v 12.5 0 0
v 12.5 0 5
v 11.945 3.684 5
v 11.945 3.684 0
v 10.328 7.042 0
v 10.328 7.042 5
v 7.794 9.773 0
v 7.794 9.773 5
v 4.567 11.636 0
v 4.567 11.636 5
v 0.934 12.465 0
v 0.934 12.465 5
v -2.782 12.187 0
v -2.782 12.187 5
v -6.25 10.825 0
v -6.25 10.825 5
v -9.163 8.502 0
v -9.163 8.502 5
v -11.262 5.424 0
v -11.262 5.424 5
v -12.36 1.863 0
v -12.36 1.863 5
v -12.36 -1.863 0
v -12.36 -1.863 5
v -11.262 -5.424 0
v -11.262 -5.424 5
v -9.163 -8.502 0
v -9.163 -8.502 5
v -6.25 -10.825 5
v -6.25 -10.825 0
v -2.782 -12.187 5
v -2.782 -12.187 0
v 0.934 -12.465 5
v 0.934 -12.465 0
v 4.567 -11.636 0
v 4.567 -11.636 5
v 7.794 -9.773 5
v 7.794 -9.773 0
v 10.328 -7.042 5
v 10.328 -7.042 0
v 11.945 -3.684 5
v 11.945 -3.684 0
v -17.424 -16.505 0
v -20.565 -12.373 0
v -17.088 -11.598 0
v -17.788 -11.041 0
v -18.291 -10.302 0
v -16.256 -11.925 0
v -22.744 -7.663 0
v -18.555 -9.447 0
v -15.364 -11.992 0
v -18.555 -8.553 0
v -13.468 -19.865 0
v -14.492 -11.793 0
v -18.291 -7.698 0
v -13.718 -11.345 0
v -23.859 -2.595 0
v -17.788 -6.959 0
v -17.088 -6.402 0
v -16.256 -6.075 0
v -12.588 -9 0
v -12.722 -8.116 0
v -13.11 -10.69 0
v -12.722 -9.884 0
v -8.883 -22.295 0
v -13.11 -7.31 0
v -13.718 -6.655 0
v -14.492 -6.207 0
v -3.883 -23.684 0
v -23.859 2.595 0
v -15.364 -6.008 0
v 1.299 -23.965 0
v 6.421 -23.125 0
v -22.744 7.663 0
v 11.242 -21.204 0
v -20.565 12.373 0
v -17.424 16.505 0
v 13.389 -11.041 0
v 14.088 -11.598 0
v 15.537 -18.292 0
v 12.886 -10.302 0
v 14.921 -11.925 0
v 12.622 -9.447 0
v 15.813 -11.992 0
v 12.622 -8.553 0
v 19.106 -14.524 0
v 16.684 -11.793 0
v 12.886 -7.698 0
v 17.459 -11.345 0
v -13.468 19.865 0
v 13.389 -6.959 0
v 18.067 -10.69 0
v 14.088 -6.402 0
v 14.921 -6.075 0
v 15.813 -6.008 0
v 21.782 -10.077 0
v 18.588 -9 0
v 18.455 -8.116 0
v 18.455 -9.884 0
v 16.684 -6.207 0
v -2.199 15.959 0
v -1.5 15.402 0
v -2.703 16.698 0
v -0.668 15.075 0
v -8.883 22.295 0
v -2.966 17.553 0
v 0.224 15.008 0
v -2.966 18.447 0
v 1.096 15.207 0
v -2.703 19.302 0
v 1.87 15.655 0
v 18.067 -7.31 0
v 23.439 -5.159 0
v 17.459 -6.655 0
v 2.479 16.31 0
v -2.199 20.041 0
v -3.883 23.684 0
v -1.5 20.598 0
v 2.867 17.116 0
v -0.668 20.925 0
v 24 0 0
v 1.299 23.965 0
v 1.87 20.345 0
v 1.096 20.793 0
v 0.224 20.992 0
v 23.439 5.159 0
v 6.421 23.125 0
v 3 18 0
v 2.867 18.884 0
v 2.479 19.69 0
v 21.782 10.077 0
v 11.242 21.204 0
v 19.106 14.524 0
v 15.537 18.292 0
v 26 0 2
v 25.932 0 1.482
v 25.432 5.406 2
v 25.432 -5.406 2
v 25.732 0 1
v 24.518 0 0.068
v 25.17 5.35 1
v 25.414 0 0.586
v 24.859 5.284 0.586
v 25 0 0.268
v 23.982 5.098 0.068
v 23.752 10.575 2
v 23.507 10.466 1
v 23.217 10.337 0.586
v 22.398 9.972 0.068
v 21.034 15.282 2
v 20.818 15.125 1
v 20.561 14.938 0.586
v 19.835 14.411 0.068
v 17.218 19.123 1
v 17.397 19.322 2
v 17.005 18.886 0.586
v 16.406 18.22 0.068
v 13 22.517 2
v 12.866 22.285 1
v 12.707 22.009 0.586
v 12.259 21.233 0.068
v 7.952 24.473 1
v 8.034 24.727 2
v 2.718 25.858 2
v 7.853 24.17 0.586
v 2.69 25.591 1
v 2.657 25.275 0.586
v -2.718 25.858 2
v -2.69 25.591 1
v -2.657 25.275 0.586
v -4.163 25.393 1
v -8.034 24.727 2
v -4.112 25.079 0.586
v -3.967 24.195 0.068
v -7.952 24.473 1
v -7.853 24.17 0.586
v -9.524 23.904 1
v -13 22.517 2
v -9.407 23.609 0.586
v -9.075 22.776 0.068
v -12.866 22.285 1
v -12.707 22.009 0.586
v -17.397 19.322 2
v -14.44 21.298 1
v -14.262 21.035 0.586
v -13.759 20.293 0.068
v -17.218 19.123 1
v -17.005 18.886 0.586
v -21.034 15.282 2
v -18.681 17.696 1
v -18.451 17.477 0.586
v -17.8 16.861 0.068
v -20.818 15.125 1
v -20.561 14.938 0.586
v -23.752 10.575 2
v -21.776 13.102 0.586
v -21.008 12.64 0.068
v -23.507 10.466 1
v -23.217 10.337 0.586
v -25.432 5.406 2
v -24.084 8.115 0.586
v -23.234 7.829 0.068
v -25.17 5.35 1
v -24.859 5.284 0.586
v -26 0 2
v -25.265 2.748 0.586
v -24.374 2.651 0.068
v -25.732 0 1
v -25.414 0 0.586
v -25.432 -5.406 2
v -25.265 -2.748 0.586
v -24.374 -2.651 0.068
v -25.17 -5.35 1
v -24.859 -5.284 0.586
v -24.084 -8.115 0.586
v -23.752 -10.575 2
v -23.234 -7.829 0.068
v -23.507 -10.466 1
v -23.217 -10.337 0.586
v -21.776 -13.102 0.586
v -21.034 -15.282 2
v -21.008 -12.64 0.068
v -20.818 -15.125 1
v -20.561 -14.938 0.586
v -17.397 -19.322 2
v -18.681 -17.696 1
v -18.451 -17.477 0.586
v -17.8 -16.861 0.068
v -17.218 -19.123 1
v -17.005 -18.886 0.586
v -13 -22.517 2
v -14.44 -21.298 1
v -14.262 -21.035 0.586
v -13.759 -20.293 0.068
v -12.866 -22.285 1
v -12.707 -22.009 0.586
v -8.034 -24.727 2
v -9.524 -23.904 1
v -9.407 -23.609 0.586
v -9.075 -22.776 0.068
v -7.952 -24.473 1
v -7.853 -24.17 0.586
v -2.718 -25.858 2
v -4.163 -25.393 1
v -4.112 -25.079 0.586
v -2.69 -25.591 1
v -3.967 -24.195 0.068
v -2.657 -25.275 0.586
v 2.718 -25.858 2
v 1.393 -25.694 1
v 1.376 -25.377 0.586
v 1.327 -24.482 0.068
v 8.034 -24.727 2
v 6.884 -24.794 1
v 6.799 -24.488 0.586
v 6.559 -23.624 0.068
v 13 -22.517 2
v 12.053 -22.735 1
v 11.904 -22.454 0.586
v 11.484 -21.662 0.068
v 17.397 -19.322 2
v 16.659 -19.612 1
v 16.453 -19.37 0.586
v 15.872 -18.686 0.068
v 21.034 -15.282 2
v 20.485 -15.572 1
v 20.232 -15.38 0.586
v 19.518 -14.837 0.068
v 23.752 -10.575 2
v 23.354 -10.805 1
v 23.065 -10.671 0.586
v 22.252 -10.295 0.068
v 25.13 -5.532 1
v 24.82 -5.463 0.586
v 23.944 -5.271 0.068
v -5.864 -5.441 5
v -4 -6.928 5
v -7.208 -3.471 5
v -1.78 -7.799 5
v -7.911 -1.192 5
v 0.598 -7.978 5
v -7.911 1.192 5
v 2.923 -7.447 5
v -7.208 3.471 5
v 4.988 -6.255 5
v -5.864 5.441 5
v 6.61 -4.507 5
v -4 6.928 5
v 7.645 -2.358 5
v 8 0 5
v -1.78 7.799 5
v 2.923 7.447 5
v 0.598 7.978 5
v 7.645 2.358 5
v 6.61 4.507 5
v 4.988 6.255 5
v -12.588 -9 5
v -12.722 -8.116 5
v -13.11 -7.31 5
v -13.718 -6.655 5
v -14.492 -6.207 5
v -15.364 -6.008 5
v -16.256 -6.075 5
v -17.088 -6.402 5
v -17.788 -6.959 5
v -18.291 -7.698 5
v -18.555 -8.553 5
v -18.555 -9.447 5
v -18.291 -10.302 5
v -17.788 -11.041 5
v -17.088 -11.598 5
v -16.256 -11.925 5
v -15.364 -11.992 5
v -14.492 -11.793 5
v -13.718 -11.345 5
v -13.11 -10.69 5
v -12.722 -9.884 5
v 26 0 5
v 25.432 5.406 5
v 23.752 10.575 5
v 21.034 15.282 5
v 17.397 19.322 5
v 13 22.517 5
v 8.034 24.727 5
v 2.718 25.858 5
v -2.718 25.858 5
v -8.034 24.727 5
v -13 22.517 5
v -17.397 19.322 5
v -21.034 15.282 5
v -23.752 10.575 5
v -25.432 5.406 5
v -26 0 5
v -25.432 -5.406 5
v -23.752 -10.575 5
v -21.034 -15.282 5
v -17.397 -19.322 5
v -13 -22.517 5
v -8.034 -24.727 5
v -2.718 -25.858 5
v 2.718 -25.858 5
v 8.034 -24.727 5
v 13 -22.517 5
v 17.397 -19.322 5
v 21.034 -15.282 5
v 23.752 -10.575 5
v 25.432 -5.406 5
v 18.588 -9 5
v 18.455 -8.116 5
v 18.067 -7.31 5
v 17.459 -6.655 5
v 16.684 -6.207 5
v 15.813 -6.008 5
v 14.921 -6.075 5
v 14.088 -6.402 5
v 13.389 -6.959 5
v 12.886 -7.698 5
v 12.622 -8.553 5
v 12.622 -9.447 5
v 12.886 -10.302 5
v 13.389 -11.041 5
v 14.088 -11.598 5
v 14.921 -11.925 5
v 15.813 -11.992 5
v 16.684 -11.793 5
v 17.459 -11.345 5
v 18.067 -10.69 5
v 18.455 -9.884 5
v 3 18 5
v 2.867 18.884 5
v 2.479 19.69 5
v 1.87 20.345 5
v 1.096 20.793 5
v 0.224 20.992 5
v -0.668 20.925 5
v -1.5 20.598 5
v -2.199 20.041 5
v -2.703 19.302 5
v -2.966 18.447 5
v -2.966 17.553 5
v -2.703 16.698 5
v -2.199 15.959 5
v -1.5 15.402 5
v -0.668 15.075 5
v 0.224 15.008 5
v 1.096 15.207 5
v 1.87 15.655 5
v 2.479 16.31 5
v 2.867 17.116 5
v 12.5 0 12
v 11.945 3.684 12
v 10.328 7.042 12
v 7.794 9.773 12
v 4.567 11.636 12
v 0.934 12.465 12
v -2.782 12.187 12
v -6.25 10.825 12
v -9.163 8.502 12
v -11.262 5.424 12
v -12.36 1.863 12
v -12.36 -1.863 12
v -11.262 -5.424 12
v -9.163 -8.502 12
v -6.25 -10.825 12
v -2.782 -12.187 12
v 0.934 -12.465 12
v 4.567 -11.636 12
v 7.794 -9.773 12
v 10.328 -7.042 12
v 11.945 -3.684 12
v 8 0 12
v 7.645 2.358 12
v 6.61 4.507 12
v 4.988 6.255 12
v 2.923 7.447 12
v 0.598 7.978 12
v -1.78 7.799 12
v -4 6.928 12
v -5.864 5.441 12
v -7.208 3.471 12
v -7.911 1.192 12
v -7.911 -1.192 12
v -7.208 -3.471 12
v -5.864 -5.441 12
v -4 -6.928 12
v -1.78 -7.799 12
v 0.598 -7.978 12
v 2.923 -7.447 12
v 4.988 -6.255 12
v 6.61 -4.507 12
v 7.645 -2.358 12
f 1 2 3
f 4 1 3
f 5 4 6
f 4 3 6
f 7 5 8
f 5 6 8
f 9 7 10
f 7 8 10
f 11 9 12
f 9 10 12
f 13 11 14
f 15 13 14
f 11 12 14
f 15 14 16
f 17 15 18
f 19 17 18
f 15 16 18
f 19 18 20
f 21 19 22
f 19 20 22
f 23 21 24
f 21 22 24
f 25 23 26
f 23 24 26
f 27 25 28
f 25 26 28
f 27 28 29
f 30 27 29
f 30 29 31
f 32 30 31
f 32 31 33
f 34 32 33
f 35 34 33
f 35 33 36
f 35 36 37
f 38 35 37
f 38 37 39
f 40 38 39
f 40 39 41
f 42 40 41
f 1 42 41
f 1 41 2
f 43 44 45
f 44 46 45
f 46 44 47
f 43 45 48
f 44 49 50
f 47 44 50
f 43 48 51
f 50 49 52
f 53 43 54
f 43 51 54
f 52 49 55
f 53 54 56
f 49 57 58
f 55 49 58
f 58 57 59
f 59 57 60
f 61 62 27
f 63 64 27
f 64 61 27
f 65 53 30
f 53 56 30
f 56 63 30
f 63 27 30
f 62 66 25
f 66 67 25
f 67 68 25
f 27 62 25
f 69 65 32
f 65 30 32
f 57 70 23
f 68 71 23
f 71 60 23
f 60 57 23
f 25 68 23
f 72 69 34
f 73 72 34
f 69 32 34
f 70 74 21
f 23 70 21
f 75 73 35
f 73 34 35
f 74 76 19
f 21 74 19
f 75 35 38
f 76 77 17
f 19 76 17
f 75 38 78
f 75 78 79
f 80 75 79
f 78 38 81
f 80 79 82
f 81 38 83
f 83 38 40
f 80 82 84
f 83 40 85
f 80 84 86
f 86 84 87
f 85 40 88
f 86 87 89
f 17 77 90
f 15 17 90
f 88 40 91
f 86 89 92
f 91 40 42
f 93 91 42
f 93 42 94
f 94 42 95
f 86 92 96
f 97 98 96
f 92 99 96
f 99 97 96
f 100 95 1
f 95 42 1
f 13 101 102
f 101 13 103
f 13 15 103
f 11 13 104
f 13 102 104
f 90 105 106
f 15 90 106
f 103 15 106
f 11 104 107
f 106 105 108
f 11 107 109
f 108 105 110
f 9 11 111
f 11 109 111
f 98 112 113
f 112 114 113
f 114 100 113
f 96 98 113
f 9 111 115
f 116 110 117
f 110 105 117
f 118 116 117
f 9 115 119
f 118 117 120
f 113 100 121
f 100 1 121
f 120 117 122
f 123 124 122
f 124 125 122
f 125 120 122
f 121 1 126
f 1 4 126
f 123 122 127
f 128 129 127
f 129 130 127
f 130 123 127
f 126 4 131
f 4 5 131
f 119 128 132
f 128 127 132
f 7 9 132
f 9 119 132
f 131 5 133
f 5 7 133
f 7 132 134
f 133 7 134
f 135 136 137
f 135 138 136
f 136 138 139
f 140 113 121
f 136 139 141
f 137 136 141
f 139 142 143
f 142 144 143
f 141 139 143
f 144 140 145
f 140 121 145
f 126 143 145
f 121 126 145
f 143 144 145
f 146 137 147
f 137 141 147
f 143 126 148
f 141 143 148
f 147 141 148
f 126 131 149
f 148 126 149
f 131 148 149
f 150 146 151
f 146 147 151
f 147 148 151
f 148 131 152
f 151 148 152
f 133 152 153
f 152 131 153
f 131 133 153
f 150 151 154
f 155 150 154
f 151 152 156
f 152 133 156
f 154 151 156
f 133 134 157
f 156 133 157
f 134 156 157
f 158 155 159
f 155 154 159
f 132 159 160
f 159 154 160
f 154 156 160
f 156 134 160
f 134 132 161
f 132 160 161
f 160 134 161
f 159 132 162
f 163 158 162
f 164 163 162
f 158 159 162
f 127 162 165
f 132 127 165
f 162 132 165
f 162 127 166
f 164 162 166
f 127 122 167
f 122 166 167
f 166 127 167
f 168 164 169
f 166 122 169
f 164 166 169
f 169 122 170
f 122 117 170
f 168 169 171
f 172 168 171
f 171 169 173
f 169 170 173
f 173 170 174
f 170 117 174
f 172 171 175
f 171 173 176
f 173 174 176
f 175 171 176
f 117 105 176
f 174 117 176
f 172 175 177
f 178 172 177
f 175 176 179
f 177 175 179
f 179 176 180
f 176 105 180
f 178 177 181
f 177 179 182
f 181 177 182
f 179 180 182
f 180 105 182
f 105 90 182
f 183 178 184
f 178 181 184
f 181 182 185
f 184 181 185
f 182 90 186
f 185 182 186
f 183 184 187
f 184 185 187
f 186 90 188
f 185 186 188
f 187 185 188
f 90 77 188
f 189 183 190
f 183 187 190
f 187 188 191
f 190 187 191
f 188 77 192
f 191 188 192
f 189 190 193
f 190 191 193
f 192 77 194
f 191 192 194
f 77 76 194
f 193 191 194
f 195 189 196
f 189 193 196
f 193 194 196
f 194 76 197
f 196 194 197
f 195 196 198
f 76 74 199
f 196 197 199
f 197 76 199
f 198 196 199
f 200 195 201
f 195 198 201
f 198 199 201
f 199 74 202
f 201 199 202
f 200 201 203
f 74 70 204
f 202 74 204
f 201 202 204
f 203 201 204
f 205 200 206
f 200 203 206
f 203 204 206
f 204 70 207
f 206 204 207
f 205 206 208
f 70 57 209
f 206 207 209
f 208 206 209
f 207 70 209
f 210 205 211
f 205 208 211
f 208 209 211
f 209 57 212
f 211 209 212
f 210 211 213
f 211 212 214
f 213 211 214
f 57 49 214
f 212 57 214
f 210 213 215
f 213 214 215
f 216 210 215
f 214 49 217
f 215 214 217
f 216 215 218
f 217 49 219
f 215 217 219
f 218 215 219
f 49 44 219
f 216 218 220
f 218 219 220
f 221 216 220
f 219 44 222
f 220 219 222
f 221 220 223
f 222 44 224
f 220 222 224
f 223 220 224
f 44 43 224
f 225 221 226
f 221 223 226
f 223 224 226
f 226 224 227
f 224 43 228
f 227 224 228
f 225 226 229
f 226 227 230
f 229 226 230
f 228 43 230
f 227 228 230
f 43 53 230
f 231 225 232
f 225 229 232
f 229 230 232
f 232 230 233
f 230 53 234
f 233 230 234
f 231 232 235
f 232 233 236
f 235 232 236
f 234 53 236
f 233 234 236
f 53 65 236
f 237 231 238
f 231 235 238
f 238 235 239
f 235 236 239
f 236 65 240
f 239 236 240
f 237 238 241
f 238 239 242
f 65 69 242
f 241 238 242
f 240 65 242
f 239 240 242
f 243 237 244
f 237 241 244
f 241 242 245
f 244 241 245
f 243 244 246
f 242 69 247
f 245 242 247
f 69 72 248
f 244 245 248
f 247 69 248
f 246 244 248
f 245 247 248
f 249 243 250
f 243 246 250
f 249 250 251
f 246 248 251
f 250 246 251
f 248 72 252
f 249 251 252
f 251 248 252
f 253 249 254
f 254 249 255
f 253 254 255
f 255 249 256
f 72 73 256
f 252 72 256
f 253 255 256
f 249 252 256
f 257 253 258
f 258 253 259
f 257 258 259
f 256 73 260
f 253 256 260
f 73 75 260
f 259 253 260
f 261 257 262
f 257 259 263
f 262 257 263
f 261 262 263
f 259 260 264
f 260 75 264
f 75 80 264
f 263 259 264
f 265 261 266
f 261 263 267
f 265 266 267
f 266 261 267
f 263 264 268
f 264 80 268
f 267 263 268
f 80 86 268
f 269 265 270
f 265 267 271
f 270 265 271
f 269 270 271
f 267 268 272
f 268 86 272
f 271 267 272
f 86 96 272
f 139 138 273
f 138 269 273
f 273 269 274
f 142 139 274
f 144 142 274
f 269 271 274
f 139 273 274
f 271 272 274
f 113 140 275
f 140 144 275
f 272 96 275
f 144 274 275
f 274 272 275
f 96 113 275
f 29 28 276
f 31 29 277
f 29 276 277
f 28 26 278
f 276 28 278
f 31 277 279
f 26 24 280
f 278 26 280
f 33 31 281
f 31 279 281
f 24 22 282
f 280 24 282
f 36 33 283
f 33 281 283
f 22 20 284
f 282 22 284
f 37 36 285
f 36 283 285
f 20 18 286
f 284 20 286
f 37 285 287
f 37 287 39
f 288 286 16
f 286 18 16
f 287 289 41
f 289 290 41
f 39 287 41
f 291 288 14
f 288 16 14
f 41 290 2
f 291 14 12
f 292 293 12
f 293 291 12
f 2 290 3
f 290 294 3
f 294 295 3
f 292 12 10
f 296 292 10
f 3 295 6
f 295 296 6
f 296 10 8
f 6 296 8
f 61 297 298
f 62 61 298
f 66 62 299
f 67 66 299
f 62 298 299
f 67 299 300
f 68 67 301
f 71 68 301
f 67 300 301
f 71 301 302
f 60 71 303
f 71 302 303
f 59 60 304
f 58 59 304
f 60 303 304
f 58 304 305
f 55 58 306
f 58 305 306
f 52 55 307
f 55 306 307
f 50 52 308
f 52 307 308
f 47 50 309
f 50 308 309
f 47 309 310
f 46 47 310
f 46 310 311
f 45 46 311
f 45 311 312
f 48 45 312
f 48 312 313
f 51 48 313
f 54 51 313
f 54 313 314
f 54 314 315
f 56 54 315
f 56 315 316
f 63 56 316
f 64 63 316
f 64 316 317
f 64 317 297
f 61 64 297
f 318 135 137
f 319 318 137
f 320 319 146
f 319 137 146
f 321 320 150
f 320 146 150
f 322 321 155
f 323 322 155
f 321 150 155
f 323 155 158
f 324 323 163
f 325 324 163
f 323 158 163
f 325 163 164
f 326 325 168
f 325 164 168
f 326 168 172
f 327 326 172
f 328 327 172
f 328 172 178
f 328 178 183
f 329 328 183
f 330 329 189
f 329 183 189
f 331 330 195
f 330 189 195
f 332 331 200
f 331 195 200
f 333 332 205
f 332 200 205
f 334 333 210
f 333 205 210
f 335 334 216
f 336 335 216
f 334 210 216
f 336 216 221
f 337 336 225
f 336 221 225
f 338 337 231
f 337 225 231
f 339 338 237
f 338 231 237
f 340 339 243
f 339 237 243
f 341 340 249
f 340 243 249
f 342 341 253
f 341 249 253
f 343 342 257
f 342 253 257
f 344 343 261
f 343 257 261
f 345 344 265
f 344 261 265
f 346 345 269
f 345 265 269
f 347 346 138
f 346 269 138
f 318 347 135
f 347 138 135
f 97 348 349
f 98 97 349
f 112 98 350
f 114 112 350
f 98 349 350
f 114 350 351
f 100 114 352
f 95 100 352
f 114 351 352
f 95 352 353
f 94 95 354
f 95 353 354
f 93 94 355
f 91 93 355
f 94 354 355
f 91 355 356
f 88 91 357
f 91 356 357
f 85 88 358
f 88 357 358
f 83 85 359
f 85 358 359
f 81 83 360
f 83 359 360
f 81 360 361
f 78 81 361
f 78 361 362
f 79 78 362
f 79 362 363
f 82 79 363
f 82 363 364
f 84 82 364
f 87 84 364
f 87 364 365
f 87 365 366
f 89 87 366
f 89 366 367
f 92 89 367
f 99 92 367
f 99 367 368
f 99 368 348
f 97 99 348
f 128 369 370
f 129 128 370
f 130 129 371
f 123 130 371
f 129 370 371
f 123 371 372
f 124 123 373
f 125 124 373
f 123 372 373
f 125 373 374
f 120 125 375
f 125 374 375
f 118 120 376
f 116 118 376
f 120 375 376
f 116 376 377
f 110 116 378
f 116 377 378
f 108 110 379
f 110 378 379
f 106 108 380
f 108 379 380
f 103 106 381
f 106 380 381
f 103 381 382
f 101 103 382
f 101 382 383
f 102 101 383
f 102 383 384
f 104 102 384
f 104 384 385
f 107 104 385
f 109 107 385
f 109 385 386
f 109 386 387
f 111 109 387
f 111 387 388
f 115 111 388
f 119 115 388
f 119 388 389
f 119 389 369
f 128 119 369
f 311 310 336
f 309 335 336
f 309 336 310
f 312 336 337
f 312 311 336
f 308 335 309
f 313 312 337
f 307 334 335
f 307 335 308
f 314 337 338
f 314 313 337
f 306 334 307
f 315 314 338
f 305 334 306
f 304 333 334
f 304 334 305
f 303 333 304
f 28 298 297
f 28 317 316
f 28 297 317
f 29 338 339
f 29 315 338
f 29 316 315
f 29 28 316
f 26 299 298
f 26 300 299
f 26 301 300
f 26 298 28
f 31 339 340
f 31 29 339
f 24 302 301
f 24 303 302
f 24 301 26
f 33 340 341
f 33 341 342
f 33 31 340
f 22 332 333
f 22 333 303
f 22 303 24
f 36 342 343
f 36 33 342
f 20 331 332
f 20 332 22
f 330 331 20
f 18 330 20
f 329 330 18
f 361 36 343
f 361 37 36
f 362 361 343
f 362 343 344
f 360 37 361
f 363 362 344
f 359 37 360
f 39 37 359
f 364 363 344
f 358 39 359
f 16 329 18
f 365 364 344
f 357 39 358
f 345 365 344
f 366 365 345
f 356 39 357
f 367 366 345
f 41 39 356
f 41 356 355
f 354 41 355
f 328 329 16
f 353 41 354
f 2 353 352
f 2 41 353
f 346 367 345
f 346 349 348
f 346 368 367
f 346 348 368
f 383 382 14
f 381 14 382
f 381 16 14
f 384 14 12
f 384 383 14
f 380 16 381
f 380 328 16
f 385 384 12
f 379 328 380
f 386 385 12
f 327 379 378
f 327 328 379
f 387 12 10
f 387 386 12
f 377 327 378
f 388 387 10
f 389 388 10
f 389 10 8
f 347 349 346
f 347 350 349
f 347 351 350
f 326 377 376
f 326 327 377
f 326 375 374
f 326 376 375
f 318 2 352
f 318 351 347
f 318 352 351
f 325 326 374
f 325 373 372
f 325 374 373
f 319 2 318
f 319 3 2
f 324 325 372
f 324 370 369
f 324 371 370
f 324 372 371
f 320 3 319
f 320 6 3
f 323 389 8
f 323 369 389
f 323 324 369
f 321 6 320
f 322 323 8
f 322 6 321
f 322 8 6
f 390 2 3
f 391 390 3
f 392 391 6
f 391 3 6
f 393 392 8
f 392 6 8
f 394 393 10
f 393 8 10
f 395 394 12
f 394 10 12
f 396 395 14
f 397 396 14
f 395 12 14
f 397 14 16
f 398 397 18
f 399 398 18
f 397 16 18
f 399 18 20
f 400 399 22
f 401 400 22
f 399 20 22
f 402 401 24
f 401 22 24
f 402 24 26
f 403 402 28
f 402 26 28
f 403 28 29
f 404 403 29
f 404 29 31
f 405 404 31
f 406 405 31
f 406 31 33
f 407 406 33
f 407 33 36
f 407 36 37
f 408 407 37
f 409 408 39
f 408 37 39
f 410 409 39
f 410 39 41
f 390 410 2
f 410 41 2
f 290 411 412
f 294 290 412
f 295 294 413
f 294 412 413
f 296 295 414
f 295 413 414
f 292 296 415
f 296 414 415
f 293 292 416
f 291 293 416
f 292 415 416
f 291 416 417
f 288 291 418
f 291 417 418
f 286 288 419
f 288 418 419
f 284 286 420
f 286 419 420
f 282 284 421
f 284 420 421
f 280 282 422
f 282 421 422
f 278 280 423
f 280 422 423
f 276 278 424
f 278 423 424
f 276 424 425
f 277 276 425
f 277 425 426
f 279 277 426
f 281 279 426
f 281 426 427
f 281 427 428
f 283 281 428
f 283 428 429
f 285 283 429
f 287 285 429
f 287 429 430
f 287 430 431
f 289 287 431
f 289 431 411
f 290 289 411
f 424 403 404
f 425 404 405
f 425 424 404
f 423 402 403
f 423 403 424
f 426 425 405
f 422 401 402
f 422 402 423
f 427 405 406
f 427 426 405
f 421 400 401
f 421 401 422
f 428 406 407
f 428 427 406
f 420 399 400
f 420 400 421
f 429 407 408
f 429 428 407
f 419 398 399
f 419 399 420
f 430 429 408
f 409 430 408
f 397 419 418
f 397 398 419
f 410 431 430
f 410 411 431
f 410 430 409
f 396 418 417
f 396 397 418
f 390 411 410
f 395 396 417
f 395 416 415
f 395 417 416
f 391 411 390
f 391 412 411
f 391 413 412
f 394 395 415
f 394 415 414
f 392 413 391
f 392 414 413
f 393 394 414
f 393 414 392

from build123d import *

# Parameters (mm, degrees)
SKETCH1_R           = 26
BOSS_EXTRUDE1_DEPTH = 5
SKETCH2_R           = 12.5
BOSS_EXTRUDE2_DEPTH = 7
SKETCH3_R           = 8
CUT_EXTRUDE1_DEPTH  = 39.678159212
SKETCH4_R           = 3
SKETCH4_R_2         = 12.5
CUT_EXTRUDE2_DEPTH  = 38.429934544
FILLET3_R           = 2


with BuildPart() as part:
    # Sketch1 → Boss-Extrude1 (new body)
    with BuildSketch(Plane.XY):
        Circle(SKETCH1_R)
    extrude(amount=BOSS_EXTRUDE1_DEPTH)

    # Sketch2 → Boss-Extrude2 (add)
    with BuildSketch(Plane.XY.offset(5)):
        Circle(SKETCH2_R)
    extrude(amount=BOSS_EXTRUDE2_DEPTH)

    # Sketch3 → Cut-Extrude1 (cut, through all)
    with BuildSketch(Plane.XY.offset(12)):
        Circle(SKETCH3_R)
    extrude(amount=-CUT_EXTRUDE1_DEPTH, mode=Mode.SUBTRACT)

    # Sketch4 → Cut-Extrude2 (cut, through all)
    with BuildSketch(Plane.XY.offset(5)):
        with Locations((0, 18)):
            Circle(SKETCH4_R)
        with Locations((15.588457268, -9)):
            Circle(SKETCH4_R)
        with Locations((-15.588457268, -9)):
            Circle(SKETCH4_R)
        Circle(SKETCH4_R_2)
    extrude(amount=-CUT_EXTRUDE2_DEPTH, mode=Mode.SUBTRACT)


with BuildPart() as cut_extrude2_piece_1:
    # of the separate pieces the step leaves, piece 1, a body of its own (cut_extrude2_pieces)
    add(part.part.solids().sort_by_distance((26, 0, 0))[0])

    # Fillet3
    fillet3_edges = [cut_extrude2_piece_1.edges().sort_by_distance(p)[0] for p in [
        (-26, 0, 0),
    ]]
    fillet(fillet3_edges, radius=FILLET3_R)


with BuildPart() as cut_extrude2_piece_2:
    # of the separate pieces the step leaves, piece 2, a body of its own (cut_extrude2_pieces)
    add(part.part.solids().sort_by_distance((12.5, 0, 12))[0])


solid = Compound([cut_extrude2_piece_1.part, cut_extrude2_piece_2.part])
